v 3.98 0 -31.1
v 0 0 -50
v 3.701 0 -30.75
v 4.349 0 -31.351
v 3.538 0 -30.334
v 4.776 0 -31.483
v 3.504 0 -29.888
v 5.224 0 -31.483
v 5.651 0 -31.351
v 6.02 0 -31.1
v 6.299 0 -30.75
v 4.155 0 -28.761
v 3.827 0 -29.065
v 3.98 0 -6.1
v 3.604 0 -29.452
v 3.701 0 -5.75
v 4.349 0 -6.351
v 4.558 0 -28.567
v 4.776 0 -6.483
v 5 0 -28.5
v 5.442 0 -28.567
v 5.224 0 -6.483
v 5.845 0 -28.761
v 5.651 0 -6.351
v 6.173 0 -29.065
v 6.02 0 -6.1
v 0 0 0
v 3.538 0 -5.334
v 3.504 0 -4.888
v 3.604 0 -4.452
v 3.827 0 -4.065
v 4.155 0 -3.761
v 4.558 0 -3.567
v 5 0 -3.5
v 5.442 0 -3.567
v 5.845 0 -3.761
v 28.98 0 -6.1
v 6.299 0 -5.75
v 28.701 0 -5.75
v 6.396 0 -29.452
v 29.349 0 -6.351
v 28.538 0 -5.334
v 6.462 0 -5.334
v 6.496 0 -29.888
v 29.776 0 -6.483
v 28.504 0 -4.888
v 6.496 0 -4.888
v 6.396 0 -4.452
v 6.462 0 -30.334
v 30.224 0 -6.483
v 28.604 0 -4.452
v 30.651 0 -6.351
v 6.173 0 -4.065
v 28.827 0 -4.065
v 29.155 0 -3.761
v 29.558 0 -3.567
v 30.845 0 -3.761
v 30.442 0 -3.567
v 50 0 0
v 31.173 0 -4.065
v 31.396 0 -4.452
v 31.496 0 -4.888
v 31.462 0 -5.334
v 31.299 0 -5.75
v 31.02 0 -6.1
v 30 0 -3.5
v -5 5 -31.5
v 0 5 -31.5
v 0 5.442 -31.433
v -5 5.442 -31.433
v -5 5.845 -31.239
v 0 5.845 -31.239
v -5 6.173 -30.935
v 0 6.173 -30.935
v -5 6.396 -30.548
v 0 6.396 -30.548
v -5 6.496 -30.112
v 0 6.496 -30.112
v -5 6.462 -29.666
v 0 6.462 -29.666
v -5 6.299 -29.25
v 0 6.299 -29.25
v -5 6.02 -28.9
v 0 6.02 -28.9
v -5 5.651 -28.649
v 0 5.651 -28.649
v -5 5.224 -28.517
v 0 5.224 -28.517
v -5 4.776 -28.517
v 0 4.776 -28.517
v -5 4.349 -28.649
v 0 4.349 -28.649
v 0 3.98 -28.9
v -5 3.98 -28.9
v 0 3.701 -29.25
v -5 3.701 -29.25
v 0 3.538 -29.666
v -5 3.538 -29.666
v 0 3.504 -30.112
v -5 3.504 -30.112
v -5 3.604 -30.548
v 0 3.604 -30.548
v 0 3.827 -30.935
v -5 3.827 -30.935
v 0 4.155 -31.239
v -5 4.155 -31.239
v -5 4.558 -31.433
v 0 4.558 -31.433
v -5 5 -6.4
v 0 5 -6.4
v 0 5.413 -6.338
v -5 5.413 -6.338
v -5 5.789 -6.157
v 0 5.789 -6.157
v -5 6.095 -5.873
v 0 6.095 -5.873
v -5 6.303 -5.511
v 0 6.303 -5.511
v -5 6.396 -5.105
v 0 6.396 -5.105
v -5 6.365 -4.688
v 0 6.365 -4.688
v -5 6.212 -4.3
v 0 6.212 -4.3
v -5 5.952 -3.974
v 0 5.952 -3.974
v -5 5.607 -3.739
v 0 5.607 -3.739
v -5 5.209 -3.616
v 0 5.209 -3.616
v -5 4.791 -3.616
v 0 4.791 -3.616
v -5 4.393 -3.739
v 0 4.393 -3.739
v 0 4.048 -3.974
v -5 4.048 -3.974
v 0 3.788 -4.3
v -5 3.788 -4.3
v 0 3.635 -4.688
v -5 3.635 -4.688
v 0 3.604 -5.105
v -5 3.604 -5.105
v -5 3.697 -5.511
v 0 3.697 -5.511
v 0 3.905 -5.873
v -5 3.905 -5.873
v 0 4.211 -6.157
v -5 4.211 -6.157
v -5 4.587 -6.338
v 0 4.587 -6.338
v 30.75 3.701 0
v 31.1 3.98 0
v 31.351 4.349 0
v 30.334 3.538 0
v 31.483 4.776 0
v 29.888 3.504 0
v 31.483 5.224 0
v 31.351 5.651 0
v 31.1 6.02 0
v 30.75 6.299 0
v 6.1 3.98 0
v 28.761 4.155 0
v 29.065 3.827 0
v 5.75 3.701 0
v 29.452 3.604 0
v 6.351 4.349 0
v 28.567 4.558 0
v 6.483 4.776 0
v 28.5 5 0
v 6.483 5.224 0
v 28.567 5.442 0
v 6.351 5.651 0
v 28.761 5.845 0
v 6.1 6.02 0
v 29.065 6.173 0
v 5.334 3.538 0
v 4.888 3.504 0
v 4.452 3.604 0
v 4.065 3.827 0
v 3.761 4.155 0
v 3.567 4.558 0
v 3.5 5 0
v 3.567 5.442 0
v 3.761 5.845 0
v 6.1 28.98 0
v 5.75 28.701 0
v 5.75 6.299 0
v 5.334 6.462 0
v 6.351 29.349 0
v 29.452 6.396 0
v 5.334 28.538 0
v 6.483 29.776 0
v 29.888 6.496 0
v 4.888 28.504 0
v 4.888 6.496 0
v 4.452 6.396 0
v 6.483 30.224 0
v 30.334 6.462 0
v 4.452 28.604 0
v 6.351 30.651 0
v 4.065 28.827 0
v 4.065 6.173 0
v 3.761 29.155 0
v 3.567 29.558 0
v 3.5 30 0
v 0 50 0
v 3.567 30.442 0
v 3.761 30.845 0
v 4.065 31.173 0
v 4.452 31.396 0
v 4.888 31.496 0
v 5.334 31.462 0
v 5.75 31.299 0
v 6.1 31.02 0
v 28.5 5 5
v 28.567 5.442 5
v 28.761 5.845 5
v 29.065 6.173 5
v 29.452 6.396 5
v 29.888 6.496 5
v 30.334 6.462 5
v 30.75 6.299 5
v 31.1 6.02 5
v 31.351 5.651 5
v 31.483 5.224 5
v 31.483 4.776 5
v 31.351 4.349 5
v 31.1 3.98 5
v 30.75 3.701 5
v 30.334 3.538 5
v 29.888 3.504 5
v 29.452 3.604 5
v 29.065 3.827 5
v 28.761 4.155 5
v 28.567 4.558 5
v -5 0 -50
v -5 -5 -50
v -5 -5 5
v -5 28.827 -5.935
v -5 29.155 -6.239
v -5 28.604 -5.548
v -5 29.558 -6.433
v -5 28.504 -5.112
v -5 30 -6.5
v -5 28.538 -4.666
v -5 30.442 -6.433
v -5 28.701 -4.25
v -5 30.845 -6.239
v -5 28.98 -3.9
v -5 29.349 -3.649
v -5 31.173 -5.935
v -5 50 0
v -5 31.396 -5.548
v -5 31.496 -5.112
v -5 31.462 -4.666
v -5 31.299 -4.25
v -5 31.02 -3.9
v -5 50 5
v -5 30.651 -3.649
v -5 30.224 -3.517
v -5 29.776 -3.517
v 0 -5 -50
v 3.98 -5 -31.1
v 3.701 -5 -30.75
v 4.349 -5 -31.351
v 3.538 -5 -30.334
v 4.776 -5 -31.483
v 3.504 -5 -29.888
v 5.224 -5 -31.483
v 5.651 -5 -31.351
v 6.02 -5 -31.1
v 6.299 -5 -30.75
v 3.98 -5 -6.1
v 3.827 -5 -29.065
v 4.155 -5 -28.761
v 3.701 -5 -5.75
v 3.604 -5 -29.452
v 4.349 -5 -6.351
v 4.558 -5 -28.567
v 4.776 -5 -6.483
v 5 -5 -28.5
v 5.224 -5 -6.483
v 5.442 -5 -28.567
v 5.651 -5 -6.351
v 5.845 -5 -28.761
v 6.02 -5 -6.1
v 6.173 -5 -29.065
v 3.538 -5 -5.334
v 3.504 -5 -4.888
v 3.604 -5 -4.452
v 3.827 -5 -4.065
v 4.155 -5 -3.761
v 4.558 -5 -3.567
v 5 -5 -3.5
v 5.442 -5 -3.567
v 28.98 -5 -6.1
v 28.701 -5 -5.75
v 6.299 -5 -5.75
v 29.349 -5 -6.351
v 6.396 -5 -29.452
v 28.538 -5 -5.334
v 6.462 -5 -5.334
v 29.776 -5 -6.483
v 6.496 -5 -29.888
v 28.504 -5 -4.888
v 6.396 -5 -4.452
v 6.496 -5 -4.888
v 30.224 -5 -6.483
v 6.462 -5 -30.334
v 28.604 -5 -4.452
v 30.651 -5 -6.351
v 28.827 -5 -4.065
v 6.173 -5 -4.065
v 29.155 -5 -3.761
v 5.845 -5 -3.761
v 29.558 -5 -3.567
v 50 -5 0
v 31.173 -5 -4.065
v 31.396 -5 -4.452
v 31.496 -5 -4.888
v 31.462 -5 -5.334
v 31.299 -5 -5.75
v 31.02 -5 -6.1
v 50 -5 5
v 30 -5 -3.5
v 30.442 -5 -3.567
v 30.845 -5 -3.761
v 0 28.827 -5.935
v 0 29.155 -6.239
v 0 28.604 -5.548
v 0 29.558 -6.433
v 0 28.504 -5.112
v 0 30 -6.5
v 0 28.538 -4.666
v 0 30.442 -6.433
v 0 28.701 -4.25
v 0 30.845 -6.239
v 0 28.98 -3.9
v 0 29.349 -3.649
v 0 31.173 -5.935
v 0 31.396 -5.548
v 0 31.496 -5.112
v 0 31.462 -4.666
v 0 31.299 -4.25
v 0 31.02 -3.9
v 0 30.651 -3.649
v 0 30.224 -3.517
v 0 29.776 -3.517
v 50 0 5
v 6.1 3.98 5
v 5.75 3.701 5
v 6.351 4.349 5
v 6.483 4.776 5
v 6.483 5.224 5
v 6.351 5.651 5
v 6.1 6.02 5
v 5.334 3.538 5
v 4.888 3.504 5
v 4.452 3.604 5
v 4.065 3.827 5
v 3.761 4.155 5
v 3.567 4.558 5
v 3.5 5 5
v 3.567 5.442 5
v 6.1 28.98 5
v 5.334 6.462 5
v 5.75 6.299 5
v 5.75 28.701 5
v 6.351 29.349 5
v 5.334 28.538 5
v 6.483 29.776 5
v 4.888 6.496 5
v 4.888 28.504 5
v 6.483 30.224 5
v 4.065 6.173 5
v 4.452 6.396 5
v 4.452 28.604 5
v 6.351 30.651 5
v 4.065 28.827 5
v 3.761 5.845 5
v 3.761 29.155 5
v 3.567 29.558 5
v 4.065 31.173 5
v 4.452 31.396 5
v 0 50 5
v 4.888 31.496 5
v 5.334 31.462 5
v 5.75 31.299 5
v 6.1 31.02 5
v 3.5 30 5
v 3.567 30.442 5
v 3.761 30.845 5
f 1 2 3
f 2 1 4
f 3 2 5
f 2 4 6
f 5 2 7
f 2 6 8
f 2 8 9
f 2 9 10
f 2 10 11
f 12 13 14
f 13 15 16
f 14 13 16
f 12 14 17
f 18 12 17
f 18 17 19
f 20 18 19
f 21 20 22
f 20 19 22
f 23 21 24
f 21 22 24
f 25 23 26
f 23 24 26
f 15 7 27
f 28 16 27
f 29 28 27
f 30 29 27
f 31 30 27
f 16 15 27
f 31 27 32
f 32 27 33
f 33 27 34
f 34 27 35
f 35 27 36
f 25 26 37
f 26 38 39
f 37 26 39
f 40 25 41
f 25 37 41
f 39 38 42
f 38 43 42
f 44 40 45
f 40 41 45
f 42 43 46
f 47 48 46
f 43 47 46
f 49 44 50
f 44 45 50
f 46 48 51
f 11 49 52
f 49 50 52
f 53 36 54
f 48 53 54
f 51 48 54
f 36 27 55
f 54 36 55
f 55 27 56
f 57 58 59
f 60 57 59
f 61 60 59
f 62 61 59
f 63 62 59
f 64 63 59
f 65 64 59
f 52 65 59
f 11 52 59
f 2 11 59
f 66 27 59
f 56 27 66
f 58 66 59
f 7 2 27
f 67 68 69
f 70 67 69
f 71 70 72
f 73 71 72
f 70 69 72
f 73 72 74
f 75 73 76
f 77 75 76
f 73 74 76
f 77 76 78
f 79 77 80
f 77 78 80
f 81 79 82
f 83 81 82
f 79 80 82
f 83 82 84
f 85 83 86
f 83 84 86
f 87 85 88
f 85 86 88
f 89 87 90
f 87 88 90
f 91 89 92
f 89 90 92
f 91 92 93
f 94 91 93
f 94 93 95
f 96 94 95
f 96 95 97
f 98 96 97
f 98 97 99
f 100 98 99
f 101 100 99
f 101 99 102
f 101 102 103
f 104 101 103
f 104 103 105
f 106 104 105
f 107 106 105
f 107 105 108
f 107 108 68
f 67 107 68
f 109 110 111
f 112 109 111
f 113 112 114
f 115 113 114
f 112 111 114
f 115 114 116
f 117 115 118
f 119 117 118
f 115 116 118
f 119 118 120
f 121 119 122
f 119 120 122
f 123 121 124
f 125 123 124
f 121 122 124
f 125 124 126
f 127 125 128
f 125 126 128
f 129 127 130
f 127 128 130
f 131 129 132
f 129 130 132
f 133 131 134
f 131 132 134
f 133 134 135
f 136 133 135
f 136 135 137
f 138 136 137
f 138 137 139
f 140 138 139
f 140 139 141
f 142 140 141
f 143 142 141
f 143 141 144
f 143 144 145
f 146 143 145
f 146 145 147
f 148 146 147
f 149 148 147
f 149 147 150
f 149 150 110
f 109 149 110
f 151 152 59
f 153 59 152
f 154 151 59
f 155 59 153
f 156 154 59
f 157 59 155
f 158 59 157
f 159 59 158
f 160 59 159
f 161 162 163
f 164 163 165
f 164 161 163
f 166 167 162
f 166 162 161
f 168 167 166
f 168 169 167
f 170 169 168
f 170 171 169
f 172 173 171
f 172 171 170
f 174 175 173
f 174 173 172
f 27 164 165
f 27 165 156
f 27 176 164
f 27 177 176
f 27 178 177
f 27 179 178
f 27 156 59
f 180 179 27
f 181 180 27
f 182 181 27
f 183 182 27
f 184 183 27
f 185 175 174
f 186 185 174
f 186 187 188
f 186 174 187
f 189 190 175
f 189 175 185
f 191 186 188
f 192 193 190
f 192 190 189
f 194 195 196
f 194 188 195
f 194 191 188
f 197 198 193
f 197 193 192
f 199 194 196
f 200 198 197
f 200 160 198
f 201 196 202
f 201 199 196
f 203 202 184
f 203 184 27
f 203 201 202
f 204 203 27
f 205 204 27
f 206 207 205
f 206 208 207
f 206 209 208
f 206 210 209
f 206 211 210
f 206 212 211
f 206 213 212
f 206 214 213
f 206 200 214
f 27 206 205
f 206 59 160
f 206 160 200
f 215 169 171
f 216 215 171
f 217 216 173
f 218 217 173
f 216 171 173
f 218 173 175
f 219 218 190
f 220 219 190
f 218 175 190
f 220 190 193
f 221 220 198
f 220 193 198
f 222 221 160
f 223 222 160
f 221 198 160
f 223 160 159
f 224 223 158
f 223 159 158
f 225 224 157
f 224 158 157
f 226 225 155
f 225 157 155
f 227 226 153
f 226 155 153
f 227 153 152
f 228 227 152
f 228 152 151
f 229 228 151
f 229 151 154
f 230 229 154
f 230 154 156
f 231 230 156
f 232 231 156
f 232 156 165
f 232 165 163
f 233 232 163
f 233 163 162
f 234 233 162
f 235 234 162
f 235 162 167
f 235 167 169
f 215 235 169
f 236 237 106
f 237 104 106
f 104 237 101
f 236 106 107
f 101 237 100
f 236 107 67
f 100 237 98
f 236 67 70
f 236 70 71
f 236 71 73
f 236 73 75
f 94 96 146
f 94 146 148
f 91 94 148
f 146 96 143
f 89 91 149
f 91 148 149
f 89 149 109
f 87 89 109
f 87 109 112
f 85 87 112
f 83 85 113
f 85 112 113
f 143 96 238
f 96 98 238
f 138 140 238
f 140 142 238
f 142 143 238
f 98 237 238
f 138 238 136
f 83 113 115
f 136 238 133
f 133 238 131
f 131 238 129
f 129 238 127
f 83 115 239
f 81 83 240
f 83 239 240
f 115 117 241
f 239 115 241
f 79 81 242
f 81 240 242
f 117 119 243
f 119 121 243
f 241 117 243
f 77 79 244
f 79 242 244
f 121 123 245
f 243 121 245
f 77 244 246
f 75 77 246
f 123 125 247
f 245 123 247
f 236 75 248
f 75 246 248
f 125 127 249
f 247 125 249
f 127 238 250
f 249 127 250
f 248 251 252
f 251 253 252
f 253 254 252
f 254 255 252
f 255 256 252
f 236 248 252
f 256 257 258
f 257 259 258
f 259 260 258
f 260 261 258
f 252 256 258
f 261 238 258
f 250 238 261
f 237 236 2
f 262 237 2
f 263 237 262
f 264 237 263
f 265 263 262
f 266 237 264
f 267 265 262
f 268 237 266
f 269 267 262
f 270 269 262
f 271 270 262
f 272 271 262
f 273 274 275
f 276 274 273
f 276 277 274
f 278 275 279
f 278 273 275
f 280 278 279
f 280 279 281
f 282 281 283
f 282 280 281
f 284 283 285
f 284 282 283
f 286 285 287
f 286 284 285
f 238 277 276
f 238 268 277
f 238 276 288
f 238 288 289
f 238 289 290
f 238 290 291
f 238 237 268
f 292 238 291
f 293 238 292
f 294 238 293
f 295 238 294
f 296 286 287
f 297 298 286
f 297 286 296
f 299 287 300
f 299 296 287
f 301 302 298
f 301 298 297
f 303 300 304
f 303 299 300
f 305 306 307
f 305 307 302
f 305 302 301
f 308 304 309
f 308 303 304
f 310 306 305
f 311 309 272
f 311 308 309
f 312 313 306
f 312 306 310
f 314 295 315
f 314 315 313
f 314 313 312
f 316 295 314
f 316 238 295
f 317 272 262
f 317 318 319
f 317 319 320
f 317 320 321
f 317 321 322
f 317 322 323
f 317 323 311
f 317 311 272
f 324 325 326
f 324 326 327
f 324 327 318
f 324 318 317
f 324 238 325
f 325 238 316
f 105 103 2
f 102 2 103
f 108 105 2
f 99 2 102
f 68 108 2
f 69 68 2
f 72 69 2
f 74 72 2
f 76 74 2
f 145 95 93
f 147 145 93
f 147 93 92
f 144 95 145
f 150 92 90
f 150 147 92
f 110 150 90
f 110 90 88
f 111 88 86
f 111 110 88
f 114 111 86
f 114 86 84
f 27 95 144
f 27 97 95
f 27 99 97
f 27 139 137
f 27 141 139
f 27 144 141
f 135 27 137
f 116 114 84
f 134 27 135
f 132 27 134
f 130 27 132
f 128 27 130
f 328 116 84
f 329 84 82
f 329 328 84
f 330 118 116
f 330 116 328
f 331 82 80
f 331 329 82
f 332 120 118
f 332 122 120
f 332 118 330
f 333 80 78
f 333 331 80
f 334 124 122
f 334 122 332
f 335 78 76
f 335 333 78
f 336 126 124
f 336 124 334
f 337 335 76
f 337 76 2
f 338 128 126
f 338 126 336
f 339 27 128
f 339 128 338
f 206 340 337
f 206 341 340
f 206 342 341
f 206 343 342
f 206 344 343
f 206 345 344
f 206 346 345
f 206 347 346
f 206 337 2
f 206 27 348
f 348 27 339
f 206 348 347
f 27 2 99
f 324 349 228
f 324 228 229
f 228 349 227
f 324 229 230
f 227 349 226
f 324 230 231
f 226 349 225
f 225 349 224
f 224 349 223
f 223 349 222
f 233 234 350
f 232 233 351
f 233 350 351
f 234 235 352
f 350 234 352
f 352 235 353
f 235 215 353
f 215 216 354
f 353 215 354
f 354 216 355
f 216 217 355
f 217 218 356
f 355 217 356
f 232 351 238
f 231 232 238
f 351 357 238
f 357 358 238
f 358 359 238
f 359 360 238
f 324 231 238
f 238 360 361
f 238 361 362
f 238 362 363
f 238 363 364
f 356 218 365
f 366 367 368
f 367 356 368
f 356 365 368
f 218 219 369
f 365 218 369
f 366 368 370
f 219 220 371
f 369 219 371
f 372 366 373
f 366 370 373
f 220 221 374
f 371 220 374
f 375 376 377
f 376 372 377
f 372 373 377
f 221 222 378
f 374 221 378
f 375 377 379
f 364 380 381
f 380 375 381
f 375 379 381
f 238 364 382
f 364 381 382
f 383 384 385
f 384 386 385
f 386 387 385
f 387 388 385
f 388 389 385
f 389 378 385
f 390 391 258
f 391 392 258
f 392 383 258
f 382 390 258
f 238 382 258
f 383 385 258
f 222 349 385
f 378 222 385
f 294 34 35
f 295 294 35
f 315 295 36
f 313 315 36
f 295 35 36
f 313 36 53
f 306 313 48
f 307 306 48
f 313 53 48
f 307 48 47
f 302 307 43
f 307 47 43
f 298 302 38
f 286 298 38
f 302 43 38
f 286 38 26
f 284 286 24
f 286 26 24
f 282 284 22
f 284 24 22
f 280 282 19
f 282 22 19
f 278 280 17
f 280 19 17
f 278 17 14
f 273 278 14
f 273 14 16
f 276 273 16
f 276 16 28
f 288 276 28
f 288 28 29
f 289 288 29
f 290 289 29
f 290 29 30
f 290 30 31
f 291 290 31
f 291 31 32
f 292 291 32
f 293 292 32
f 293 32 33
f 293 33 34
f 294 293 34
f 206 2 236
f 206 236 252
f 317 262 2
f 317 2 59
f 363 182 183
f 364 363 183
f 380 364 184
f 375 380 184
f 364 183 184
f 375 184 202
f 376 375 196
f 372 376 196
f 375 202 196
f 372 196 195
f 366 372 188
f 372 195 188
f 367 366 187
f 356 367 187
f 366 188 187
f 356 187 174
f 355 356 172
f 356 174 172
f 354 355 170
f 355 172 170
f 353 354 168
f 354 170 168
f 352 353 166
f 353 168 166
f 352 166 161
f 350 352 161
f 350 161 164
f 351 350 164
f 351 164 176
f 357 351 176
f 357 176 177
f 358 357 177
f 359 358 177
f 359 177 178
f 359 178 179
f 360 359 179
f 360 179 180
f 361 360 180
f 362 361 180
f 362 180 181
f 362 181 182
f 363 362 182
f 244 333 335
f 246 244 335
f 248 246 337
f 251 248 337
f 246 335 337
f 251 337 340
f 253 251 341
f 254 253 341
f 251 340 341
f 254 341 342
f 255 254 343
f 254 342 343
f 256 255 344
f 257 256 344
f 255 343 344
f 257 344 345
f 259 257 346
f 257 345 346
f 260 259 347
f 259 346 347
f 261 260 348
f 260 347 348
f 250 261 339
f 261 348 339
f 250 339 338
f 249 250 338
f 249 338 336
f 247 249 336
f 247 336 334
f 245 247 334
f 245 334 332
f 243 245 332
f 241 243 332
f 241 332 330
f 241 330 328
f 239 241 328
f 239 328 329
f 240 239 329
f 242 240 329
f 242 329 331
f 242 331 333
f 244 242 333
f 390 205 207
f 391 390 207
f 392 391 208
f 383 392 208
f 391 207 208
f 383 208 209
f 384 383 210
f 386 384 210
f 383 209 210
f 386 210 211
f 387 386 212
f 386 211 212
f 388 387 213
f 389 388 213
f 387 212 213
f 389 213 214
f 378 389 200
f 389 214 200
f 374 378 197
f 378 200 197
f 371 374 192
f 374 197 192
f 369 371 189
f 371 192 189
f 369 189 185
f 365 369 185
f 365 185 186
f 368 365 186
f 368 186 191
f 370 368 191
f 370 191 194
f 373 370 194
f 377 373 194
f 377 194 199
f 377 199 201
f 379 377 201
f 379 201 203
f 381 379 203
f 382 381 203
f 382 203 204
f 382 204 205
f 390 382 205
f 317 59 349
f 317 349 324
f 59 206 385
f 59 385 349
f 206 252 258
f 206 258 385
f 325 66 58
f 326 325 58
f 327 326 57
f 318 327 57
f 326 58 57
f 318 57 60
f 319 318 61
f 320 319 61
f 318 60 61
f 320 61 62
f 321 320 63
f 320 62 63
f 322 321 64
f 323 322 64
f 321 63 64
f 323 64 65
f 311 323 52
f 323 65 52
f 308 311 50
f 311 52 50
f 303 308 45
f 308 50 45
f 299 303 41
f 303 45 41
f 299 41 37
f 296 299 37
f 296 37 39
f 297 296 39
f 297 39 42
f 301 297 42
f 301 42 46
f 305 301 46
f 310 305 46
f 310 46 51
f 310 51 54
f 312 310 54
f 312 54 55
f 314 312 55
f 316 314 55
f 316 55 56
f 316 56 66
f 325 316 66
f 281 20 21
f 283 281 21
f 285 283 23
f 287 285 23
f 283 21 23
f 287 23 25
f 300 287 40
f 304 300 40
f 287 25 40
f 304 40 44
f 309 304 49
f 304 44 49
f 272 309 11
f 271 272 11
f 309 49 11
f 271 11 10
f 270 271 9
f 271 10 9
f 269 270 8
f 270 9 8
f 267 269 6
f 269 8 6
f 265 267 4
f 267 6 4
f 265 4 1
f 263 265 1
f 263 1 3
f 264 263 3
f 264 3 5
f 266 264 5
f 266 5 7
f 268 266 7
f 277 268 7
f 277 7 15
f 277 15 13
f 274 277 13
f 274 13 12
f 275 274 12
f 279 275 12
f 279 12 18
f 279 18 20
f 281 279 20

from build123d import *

# Parameters (mm, degrees)
EXTRUDE_1_DEPTH     = 5
EXTRUDE_2_DEPTH     = 5
SKETCH_4_W          = 5
SKETCH_4_H          = 5
EXTRUDE_4_DEPTH     = 50
EXTRUDE_13_DEPTH    = 5
SKETCH_8_R          = 1.5
SKETCH_8_R_2        = 1.4
CUT_EXTRUDE_1_DEPTH = 87.602540378
SKETCH_9_R          = 1.5
CUT_EXTRUDE_2_DEPTH = 87.602540378
SKETCH_10_R         = 1.5
CUT_EXTRUDE_3_DEPTH = 87.602540378


with BuildPart() as part:
    # 草图1 → 凸台-拉伸1 (new body)
    with BuildSketch(Plane.XY):
        Polygon((0, 50), (50, 0), (50, -5), (-5, -5), (-5, 50), align=None)
    extrude(amount=EXTRUDE_1_DEPTH)



with BuildPart() as body_2:
    # 草图2 → 凸台-拉伸2 (new body)
    with BuildSketch(Plane(origin=(0, 0, 0), x_dir=(0, 0, -1), z_dir=(1, 0, 0))):
        Polygon((0, 0), (50, 0), (0, 50), align=None)
    extrude(amount=-EXTRUDE_2_DEPTH)

    # 草图4 → 凸台-拉伸4 (add)
    with BuildSketch(Plane.XY):
        with Locations((-2.5, -2.5)):
            Rectangle(SKETCH_4_W, SKETCH_4_H)
    extrude(amount=-EXTRUDE_4_DEPTH)


with BuildPart() as part_1:
    add(part.part)

    add(body_2.part)  # 凸台-拉伸13 merges body 2
    # 草图7 → 凸台-拉伸13 (add)
    with BuildSketch(Plane.XZ.offset(5)):
        Polygon((50, 0), (0, 0), (0, -50), align=None)
    extrude(amount=-EXTRUDE_13_DEPTH)

    # 草图8 → 切除-拉伸1 (cut, through all)
    with BuildSketch(Plane(origin=(0, 0, 0), x_dir=(0, 0, -1), z_dir=(1, 0, 0))):
        with Locations((5, 30)):
            Circle(SKETCH_8_R)
        with Locations((5, 5)):
            Circle(SKETCH_8_R_2)
        with Locations((30, 5)):
            Circle(SKETCH_8_R)
    extrude(amount=-CUT_EXTRUDE_1_DEPTH, mode=Mode.SUBTRACT)

    # 草图9 → 切除-拉伸2 (cut, through all)
    with BuildSketch(Plane(origin=(0, 0, 0), x_dir=(-1, 0, 0), z_dir=(0, 0, -1))):
        with Locations((-5, 30)):
            Circle(SKETCH_9_R)
        with Locations((-5, 5)):
            Circle(SKETCH_9_R)
        with Locations((-30, 5)):
            Circle(SKETCH_9_R)
    extrude(amount=-CUT_EXTRUDE_2_DEPTH, mode=Mode.SUBTRACT)

    # 草图10 → 切除-拉伸3 (cut, through all)
    with BuildSketch(Plane(origin=(0, 0, 0), x_dir=(1, 0, 0), z_dir=(0, 1, 0))):
        with Locations(Location((5, 30, 0), (0, 0, 270))):
            Circle(SKETCH_10_R)
        with Locations(Location((5, 5, 0), (0, 0, 270))):
            Circle(SKETCH_10_R)
        with Locations(Location((30, 5, 0), (0, 0, 270))):
            Circle(SKETCH_10_R)
    extrude(amount=-CUT_EXTRUDE_3_DEPTH, mode=Mode.SUBTRACT)


solid = part_1.part
